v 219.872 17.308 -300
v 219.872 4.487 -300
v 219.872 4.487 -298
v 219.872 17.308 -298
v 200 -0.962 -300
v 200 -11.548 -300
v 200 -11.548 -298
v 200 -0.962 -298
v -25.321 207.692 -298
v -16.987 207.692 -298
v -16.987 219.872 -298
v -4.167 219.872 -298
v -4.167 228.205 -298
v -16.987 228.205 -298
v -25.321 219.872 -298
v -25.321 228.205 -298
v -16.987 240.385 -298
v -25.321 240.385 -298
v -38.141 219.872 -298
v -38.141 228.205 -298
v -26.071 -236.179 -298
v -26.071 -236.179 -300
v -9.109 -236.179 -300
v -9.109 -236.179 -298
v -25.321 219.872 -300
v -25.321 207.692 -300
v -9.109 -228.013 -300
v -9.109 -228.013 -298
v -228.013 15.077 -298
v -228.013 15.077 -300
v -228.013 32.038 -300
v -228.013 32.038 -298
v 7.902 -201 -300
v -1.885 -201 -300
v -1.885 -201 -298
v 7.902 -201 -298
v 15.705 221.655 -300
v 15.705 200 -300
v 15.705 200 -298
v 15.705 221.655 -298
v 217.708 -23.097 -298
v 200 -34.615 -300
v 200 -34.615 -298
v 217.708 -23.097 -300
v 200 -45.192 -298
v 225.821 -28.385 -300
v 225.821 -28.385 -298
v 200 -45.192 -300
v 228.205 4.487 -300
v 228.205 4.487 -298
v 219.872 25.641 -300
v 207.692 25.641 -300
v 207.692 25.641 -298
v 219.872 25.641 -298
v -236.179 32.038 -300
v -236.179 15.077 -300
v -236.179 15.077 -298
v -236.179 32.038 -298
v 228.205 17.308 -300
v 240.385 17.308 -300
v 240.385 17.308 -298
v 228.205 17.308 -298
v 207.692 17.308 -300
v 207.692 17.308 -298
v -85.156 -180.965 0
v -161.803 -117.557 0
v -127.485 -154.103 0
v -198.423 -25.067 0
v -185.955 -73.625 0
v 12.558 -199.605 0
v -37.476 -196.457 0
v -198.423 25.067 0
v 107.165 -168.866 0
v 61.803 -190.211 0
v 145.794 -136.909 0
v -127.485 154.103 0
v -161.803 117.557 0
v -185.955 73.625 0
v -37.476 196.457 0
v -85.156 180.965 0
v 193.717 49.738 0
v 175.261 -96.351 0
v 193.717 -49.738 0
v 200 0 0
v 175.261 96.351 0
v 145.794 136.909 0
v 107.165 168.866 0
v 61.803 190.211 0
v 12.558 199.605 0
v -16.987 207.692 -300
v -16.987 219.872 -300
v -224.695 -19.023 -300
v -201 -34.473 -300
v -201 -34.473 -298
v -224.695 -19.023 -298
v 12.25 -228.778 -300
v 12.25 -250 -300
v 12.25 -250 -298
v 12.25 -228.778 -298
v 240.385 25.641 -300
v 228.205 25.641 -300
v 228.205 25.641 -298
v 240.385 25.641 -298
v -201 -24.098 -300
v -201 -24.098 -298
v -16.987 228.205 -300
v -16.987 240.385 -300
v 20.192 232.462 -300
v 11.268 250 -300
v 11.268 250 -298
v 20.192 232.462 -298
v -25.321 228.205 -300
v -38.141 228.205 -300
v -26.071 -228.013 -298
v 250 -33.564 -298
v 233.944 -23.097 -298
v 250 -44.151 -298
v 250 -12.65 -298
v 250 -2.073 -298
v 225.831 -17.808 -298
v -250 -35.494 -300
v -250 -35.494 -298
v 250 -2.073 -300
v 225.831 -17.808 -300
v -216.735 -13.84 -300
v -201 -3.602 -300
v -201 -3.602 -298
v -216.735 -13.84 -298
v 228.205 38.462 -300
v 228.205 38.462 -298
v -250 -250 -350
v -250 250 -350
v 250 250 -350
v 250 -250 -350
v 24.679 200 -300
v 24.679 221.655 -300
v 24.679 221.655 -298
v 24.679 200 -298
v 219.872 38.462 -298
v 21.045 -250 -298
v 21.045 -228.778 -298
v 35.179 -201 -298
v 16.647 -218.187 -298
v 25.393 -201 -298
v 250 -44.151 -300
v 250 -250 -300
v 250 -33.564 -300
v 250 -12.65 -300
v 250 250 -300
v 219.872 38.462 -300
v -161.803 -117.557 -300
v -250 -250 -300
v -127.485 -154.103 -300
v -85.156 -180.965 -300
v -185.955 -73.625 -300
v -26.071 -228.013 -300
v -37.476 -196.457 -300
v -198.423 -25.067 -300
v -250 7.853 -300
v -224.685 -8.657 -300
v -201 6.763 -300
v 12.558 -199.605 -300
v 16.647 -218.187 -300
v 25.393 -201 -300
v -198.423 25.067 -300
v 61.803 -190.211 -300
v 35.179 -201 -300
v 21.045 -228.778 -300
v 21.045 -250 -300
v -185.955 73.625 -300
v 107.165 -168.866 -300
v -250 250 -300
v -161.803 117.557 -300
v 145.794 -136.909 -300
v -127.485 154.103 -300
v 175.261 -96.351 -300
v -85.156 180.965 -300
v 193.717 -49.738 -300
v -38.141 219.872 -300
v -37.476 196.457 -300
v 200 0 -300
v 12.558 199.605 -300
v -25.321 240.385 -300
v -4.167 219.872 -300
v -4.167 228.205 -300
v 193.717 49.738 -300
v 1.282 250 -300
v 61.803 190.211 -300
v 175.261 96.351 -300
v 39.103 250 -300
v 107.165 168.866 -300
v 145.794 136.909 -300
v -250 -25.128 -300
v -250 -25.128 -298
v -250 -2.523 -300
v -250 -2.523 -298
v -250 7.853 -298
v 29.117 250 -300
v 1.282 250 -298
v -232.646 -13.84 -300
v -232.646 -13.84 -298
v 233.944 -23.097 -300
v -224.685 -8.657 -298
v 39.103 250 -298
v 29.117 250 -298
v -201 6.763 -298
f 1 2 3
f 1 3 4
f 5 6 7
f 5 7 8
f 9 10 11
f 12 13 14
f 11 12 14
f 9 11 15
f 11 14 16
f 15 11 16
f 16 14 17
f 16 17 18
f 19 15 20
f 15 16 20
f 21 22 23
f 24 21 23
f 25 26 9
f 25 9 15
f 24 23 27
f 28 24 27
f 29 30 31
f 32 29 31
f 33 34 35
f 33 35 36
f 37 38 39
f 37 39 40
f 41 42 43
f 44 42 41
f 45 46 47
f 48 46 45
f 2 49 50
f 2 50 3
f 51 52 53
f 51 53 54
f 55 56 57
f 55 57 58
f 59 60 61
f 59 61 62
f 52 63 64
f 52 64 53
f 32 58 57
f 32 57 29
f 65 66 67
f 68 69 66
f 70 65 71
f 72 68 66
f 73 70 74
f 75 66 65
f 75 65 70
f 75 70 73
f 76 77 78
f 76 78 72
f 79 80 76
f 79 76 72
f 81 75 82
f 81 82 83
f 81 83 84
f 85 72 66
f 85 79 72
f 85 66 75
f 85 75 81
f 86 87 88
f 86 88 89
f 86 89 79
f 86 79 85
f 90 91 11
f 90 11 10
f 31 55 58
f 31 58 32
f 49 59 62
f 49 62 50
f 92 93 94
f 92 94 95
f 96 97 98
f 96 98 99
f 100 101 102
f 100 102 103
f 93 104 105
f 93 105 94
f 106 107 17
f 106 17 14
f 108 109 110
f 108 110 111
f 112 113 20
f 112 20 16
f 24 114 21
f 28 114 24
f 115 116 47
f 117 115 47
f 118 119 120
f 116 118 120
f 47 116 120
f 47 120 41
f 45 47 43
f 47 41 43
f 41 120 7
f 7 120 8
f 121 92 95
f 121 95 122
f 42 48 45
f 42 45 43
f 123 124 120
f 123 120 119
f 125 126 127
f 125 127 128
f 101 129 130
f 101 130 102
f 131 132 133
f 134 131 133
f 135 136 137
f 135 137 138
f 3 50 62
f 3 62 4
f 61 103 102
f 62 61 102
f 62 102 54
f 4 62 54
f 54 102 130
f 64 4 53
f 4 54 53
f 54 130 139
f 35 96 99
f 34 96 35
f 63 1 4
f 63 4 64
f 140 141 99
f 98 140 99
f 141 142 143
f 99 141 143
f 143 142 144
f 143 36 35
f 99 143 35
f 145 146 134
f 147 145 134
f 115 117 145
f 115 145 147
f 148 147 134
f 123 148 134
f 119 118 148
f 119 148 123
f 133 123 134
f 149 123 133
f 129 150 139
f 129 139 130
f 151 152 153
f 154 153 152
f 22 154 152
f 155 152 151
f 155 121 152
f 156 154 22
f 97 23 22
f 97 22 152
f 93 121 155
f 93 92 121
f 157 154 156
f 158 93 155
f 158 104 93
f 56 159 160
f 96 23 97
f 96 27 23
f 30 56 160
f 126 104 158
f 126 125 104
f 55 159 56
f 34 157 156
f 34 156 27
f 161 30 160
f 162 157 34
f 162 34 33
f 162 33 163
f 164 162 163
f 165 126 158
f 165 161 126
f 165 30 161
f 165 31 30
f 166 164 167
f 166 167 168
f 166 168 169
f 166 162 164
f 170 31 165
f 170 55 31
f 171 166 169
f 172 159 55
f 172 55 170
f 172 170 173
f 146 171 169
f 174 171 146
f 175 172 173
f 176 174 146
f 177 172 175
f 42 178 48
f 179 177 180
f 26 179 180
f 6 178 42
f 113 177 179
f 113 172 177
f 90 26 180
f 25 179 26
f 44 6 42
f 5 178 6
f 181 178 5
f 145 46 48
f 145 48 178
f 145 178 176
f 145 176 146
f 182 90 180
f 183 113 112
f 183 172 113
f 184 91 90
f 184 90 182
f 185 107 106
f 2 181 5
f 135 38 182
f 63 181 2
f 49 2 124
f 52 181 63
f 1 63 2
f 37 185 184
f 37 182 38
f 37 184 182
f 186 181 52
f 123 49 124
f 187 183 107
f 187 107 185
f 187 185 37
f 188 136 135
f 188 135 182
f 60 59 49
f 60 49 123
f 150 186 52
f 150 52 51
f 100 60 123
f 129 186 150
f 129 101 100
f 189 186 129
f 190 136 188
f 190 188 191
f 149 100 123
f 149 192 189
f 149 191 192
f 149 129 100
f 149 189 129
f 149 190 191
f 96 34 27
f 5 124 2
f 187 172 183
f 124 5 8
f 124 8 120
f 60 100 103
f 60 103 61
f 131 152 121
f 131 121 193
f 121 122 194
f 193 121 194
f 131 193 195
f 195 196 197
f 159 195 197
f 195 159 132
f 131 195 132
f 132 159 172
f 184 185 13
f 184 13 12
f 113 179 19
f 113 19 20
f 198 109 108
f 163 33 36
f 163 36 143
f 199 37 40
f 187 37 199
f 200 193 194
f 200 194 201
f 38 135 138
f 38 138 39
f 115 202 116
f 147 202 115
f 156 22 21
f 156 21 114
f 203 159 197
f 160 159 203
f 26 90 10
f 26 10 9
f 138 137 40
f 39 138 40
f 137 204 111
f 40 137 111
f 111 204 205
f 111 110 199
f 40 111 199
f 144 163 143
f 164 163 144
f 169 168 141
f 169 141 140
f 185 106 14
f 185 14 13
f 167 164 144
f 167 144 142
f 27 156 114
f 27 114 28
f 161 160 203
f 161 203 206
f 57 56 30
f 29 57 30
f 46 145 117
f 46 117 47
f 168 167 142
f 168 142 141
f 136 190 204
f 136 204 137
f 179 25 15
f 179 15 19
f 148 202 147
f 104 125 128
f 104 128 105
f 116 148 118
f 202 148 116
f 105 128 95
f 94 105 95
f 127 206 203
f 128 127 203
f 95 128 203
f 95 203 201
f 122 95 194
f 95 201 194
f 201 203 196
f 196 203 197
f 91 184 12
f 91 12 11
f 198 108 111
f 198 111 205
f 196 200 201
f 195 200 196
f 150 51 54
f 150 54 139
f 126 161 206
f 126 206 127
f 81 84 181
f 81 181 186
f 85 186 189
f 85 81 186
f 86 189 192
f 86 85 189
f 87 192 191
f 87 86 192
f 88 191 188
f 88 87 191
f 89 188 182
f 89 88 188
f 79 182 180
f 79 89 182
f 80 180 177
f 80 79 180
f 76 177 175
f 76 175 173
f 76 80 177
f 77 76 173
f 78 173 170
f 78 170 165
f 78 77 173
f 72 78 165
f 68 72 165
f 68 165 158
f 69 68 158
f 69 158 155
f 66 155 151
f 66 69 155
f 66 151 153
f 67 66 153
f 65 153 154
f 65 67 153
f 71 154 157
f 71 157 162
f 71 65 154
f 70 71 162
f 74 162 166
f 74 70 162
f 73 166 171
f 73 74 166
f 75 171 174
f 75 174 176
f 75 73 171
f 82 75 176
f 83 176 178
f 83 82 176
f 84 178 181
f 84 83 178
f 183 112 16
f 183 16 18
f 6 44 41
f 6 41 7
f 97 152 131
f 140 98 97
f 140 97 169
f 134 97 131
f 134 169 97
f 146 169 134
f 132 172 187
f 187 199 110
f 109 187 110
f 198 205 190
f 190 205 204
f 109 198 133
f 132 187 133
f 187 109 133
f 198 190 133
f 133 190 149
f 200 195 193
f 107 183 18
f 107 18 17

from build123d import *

# Parameters (mm, degrees)
SKETCH3_R           = 200
BOSS_EXTRUDE3_DEPTH = 300
BOSS_EXTRUDE4_START = -300
SKETCH3_3_W         = 500
SKETCH3_3_H         = 500
BOSS_EXTRUDE4_DEPTH = 50
SKETCH4_W           = 8.166666666
SKETCH4_H           = 16.961538461
SKETCH4_W_2         = 16.961538462
SKETCH4_H_2         = 8.166666666
BOSS_EXTRUDE5_DEPTH = 2


with BuildPart() as part:
    # Sketch3 → Boss-Extrude3 (new body)
    with BuildSketch(Plane.XY):
        Circle(SKETCH3_R)
    extrude(amount=-BOSS_EXTRUDE3_DEPTH)

    # Sketch3<3> → Boss-Extrude4 (add)
    with BuildSketch(Plane.XY.offset(BOSS_EXTRUDE4_START)):
        Rectangle(SKETCH3_3_W, SKETCH3_3_H)
    extrude(amount=-BOSS_EXTRUDE4_DEPTH)

    # Sketch4 → Boss-Extrude5 (add)
    with BuildSketch(Plane.XY.offset(-300)):
        Polygon((228.205128205, 25.641025641), (240.384615385, 25.641025641), (240.384615385, 17.307692308), (228.205128205, 17.307692308), (228.205128205, 4.487179487), (219.871794872, 4.487179487), (219.871794872, 17.307692308), (207.692307692, 17.307692308), (207.692307692, 25.641025641), (219.871794872, 25.641025641), (219.871794872, 38.461538462), (228.205128205, 38.461538462), align=None)
        Polygon((250, -2.073317308), (250, -12.650240385), (233.944310897, -23.096955128), (250, -33.563701923), (250, -44.150641026), (225.821314103, -28.385416667), (200, -45.192307692), (200, -34.615384615), (217.708333333, -23.096955128), (200, -11.548477564), (200, -0.961538462), (225.831330128, -17.80849359), align=None)
        Polygon((-25.320512821, 228.205128205), (-25.320512821, 240.384615385), (-16.987179487, 240.384615385), (-16.987179487, 228.205128205), (-4.166666667, 228.205128205), (-4.166666667, 219.871794872), (-16.987179487, 219.871794872), (-16.987179487, 207.692307692), (-25.320512821, 207.692307692), (-25.320512821, 219.871794872), (-38.141025641, 219.871794872), (-38.141025641, 228.205128205), align=None)
        Polygon((1.282051282, 250), (11.268028846, 250), (20.192307692, 232.461939103), (29.116586538, 250), (39.102564103, 250), (24.679487179, 221.654647436), (24.679487179, 200), (15.705128205, 200), (15.705128205, 221.654647436), align=None)
        Polygon((-201, 6.763020833), (-201, -3.602363782), (-216.734575321, -13.840144231), (-201, -24.09755609), (-201, -34.47275641), (-224.695112179, -19.022836538), (-250, -35.493589744), (-250, -25.128205128), (-232.645833333, -13.840144231), (-250, -2.522636218), (-250, 7.852564103), (-224.685296474, -8.657451923), align=None)
        with Locations((-232.096153846, 23.557692308)):
            Rectangle(SKETCH4_W, SKETCH4_H)
        with Locations((-17.58974359, -232.096153846)):
            Rectangle(SKETCH4_W_2, SKETCH4_H_2)
        Polygon((-1.884615385, -201), (7.901642628, -201), (16.647435897, -218.187299679), (25.393229167, -201), (35.179487179, -201), (21.044871795, -228.778445513), (21.044871795, -250), (12.25, -250), (12.25, -228.778445513), align=None)
    extrude(amount=BOSS_EXTRUDE5_DEPTH)


solid = part.part
